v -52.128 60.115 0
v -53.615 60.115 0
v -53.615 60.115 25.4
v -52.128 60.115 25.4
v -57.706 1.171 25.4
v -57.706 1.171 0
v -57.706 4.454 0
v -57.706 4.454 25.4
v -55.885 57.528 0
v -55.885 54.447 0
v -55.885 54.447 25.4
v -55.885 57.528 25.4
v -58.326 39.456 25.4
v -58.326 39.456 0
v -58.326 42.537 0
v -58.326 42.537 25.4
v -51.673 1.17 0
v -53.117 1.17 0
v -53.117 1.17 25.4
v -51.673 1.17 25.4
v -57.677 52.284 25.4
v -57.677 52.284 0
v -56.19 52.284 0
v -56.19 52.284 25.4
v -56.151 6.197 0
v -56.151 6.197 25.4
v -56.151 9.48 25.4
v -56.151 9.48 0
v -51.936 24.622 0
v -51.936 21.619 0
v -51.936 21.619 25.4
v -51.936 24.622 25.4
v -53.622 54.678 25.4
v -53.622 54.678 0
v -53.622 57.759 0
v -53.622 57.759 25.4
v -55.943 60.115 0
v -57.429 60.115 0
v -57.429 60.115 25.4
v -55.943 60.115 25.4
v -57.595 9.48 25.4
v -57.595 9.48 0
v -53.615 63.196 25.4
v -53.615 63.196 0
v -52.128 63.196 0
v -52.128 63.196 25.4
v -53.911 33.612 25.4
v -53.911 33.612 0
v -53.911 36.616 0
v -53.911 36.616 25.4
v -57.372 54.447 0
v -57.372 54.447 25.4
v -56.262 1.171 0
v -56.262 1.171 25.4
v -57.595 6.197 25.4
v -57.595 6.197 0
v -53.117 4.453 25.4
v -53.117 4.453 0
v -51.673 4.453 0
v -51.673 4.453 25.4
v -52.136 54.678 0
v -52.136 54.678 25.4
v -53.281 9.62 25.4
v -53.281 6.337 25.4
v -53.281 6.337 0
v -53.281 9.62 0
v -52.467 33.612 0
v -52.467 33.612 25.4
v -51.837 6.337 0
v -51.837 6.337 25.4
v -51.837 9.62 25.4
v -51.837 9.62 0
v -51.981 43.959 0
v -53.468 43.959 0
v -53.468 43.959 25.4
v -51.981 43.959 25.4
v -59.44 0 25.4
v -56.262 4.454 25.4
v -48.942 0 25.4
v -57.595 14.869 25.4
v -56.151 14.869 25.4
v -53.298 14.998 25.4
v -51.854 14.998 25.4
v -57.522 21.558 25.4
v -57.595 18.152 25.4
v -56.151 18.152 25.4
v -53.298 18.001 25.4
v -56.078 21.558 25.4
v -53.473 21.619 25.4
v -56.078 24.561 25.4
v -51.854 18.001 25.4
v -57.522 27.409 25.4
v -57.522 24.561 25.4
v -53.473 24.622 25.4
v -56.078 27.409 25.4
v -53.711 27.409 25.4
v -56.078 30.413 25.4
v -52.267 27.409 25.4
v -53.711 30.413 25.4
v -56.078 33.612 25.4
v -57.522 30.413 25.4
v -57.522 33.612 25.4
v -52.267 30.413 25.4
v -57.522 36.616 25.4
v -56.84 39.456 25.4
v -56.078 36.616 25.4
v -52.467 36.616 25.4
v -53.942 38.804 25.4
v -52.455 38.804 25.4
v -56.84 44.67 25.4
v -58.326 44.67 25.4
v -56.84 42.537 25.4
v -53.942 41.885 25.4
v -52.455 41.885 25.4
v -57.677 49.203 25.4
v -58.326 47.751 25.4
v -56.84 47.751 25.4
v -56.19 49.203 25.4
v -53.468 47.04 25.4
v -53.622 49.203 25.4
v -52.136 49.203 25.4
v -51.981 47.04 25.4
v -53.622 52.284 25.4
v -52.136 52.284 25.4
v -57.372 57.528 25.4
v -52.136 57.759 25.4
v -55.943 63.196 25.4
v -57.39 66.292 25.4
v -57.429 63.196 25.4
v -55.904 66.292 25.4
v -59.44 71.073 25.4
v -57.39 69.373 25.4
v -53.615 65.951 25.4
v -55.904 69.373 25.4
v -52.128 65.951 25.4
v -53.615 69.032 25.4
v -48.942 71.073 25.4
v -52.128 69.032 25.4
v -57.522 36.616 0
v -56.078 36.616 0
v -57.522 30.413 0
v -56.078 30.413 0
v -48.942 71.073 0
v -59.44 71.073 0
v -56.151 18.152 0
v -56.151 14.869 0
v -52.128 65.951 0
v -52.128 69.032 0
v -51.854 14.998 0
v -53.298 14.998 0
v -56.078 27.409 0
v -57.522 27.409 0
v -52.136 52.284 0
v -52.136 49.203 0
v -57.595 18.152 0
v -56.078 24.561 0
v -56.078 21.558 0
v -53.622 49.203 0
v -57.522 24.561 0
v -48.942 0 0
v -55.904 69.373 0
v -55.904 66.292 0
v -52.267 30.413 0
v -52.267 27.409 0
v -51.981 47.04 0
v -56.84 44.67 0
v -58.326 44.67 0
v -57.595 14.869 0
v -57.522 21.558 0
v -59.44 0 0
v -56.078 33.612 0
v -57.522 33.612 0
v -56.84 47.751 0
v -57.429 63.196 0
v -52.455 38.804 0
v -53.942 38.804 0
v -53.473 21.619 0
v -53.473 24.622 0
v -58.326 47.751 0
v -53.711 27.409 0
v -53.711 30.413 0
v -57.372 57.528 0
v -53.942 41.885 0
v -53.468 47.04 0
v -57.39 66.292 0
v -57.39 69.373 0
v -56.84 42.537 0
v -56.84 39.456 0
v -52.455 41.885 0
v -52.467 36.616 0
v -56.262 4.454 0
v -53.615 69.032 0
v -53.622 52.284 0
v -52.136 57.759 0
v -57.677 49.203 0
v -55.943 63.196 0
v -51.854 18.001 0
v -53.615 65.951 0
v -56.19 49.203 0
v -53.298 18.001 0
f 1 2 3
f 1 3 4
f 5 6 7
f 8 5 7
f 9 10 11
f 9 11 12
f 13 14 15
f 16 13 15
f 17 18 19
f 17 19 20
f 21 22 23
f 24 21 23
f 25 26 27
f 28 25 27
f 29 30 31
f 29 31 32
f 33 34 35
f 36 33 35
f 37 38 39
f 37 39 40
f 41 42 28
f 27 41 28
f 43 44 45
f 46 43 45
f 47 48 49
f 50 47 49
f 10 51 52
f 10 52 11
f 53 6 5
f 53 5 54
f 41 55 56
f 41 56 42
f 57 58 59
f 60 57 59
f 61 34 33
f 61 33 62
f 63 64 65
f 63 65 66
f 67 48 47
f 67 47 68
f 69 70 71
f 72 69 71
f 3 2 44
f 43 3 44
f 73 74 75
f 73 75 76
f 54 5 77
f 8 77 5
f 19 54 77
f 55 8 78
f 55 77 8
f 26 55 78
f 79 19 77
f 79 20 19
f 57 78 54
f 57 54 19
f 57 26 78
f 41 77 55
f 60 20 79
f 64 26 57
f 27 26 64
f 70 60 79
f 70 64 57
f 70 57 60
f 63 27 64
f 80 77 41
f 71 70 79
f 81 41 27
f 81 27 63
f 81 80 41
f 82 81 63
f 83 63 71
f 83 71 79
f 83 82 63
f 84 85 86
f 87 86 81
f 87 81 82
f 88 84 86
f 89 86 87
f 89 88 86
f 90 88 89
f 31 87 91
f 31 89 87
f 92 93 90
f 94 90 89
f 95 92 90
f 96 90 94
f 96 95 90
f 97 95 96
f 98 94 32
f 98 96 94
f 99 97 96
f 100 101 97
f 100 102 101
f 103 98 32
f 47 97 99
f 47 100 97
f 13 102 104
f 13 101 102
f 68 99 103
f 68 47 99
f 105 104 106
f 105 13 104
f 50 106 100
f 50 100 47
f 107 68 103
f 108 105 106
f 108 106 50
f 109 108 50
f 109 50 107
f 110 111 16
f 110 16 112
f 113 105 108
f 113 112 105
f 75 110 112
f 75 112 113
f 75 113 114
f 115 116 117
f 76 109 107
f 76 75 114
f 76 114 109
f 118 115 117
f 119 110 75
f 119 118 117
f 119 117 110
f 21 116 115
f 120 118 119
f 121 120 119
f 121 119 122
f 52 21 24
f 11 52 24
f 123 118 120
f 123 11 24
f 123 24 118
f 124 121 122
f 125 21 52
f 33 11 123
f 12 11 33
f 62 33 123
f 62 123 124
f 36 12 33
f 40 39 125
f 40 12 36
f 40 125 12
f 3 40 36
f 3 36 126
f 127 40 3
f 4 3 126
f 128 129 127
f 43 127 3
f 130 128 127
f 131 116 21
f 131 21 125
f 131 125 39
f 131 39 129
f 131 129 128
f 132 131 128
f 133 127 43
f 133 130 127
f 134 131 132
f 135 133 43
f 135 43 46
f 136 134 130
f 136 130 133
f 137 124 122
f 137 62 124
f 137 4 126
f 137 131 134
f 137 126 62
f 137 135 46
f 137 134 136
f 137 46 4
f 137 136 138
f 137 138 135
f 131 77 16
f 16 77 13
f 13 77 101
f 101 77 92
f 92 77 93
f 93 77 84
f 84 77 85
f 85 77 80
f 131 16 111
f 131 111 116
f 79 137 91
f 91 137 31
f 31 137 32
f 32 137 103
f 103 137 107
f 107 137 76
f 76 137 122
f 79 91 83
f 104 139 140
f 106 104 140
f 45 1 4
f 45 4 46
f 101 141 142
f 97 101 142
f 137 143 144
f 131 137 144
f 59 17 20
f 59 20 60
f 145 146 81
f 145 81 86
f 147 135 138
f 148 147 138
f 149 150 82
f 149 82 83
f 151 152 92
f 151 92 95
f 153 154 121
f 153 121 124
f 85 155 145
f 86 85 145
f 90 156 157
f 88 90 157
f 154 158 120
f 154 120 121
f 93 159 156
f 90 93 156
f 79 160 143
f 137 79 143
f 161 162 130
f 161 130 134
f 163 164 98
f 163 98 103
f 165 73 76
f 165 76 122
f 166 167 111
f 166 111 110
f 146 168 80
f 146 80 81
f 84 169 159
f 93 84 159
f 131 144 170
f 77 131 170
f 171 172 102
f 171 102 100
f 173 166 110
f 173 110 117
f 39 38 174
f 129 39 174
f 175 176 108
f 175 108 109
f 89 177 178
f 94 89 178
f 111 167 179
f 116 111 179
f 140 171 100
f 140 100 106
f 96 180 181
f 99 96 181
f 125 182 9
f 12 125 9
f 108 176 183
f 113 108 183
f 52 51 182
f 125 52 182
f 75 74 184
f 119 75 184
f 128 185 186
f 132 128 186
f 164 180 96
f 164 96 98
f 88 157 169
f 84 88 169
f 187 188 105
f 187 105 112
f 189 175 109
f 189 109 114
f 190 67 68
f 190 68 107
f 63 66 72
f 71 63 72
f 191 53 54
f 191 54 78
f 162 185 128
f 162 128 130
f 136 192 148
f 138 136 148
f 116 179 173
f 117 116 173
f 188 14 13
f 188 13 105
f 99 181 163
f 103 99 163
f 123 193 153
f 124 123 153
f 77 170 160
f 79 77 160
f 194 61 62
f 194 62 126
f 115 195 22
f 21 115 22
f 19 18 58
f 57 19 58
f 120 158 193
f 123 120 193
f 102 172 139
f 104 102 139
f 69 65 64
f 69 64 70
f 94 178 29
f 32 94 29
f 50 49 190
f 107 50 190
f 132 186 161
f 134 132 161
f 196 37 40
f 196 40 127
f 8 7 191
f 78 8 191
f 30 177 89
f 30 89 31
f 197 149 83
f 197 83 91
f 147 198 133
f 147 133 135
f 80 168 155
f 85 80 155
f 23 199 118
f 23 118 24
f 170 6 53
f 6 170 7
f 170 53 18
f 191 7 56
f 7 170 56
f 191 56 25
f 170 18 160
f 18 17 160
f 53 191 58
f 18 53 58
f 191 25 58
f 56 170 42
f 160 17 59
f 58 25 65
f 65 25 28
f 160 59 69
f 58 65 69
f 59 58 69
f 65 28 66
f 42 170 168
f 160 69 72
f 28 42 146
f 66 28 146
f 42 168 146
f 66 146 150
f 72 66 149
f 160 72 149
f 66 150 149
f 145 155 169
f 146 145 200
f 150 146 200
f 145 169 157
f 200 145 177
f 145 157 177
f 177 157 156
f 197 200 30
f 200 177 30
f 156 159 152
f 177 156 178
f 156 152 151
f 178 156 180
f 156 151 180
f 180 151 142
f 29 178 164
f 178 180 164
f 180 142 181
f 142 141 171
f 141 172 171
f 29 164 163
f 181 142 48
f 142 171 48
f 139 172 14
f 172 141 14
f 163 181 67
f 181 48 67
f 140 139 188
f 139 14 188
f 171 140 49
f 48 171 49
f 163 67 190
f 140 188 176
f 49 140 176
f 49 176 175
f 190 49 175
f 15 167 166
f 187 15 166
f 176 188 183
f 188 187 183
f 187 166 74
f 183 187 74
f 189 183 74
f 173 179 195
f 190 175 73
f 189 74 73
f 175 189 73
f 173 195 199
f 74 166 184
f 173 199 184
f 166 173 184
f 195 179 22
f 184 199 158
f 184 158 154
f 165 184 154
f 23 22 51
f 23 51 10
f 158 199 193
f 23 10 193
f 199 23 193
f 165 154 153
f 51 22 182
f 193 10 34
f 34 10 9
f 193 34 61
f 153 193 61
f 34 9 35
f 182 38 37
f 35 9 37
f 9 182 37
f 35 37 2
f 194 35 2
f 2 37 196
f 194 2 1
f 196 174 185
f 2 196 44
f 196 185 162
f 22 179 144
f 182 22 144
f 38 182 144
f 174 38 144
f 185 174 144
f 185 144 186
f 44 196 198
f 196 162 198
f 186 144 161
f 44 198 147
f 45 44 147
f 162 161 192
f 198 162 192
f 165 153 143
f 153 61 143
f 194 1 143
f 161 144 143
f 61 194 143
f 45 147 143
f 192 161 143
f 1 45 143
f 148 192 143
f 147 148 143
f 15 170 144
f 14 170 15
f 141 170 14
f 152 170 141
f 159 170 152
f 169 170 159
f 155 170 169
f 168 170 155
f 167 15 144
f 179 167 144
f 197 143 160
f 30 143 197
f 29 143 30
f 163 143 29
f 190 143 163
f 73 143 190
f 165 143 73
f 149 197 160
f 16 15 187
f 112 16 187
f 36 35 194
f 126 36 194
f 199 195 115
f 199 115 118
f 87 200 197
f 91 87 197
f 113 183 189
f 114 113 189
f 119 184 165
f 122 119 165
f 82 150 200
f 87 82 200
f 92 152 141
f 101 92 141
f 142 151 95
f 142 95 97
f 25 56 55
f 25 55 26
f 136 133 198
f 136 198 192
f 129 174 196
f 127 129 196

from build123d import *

# Parameters (mm, degrees)
F0_W     = 1.444232
F0_H     = 3.282842
F0_W_2   = 1.444231
F0_H_2   = 3.003372
F0_W_3   = 1.537525
F0_W_4   = 1.486413
F0_H_3   = 3.08099
F0_H_4   = 3.080991
F1_DEPTH = 25.4


with BuildPart() as f1:
    # F0 (on Top) → F1 (new body)
    with BuildSketch(Plane.XY):
        Polygon((-48.942287, 71.072713), (-59.440054, 71.072713), (-59.440054, 0), (-57.754032, 0), (-55.809505, 0), (-52.57833, 0), (-50.541282, 0), (-48.942287, 0), align=None)
        with Locations((-56.983804, 2.812295)):
            Rectangle(F0_W, F0_H, mode=Mode.SUBTRACT)
        with Locations((-56.872925, 7.838232)):
            Rectangle(F0_W, F0_H, mode=Mode.SUBTRACT)
        with Locations((-56.872925, 16.510591)):
            Rectangle(F0_W, F0_H, mode=Mode.SUBTRACT)
        Polygon((-57.521909, 24.464175), (-57.521909, 24.561059), (-56.077678, 24.561059), (-56.077678, 24.464175), (-56.077678, 21.557687), (-57.521909, 21.557687), align=None, mode=Mode.SUBTRACT)
        with Locations((-56.799793, 28.910887)):
            Rectangle(F0_W_2, F0_H_2, mode=Mode.SUBTRACT)
        with Locations((-56.799793, 35.114071)):
            Rectangle(F0_W_2, F0_H_2, mode=Mode.SUBTRACT)
        with Locations((-52.395074, 2.811296)):
            Rectangle(F0_W, F0_H, mode=Mode.SUBTRACT)
        with Locations((-52.558644, 7.978718)):
            Rectangle(F0_W, F0_H, mode=Mode.SUBTRACT)
        with Locations((-52.576316, 16.499392)):
            Rectangle(F0_W_2, F0_H_2, mode=Mode.SUBTRACT)
        with Locations((-52.70471, 23.120777)):
            Rectangle(F0_W_3, F0_H_2, mode=Mode.SUBTRACT)
        with Locations((-52.988848, 28.910887)):
            Rectangle(F0_W, F0_H_2, mode=Mode.SUBTRACT)
        with Locations((-53.189216, 35.114071)):
            Rectangle(F0_W, F0_H_2, mode=Mode.SUBTRACT)
        with Locations((-57.582847, 40.996084)):
            Rectangle(F0_W_4, F0_H_3, mode=Mode.SUBTRACT)
        with Locations((-57.582847, 46.210064)):
            Rectangle(F0_W_4, F0_H_3, mode=Mode.SUBTRACT)
        with Locations((-56.933529, 50.743902)):
            Rectangle(F0_W_4, F0_H_3, mode=Mode.SUBTRACT)
        with Locations((-56.628476, 55.987162)):
            Rectangle(F0_W_4, F0_H_4, mode=Mode.SUBTRACT)
        with Locations((-56.686215, 61.655125)):
            Rectangle(F0_W_4, F0_H_3, mode=Mode.SUBTRACT)
        with Locations((-56.646839, 67.83214)):
            Rectangle(F0_W_4, F0_H_3, mode=Mode.SUBTRACT)
        with Locations((-53.198363, 40.344337)):
            Rectangle(F0_W_4, F0_H_3, mode=Mode.SUBTRACT)
        with Locations((-52.879221, 50.743902)):
            Rectangle(F0_W_4, F0_H_3, mode=Mode.SUBTRACT)
        with Locations((-52.724365, 45.499066)):
            Rectangle(F0_W_4, F0_H_3, mode=Mode.SUBTRACT)
        with Locations((-52.879221, 56.218265)):
            Rectangle(F0_W_4, F0_H_3, mode=Mode.SUBTRACT)
        with Locations((-52.871432, 61.655125)):
            Rectangle(F0_W_4, F0_H_3, mode=Mode.SUBTRACT)
        with Locations((-52.871499, 67.4915)):
            Rectangle(F0_W_4, F0_H_3, mode=Mode.SUBTRACT)
    extrude(amount=F1_DEPTH)


solid = f1.part
